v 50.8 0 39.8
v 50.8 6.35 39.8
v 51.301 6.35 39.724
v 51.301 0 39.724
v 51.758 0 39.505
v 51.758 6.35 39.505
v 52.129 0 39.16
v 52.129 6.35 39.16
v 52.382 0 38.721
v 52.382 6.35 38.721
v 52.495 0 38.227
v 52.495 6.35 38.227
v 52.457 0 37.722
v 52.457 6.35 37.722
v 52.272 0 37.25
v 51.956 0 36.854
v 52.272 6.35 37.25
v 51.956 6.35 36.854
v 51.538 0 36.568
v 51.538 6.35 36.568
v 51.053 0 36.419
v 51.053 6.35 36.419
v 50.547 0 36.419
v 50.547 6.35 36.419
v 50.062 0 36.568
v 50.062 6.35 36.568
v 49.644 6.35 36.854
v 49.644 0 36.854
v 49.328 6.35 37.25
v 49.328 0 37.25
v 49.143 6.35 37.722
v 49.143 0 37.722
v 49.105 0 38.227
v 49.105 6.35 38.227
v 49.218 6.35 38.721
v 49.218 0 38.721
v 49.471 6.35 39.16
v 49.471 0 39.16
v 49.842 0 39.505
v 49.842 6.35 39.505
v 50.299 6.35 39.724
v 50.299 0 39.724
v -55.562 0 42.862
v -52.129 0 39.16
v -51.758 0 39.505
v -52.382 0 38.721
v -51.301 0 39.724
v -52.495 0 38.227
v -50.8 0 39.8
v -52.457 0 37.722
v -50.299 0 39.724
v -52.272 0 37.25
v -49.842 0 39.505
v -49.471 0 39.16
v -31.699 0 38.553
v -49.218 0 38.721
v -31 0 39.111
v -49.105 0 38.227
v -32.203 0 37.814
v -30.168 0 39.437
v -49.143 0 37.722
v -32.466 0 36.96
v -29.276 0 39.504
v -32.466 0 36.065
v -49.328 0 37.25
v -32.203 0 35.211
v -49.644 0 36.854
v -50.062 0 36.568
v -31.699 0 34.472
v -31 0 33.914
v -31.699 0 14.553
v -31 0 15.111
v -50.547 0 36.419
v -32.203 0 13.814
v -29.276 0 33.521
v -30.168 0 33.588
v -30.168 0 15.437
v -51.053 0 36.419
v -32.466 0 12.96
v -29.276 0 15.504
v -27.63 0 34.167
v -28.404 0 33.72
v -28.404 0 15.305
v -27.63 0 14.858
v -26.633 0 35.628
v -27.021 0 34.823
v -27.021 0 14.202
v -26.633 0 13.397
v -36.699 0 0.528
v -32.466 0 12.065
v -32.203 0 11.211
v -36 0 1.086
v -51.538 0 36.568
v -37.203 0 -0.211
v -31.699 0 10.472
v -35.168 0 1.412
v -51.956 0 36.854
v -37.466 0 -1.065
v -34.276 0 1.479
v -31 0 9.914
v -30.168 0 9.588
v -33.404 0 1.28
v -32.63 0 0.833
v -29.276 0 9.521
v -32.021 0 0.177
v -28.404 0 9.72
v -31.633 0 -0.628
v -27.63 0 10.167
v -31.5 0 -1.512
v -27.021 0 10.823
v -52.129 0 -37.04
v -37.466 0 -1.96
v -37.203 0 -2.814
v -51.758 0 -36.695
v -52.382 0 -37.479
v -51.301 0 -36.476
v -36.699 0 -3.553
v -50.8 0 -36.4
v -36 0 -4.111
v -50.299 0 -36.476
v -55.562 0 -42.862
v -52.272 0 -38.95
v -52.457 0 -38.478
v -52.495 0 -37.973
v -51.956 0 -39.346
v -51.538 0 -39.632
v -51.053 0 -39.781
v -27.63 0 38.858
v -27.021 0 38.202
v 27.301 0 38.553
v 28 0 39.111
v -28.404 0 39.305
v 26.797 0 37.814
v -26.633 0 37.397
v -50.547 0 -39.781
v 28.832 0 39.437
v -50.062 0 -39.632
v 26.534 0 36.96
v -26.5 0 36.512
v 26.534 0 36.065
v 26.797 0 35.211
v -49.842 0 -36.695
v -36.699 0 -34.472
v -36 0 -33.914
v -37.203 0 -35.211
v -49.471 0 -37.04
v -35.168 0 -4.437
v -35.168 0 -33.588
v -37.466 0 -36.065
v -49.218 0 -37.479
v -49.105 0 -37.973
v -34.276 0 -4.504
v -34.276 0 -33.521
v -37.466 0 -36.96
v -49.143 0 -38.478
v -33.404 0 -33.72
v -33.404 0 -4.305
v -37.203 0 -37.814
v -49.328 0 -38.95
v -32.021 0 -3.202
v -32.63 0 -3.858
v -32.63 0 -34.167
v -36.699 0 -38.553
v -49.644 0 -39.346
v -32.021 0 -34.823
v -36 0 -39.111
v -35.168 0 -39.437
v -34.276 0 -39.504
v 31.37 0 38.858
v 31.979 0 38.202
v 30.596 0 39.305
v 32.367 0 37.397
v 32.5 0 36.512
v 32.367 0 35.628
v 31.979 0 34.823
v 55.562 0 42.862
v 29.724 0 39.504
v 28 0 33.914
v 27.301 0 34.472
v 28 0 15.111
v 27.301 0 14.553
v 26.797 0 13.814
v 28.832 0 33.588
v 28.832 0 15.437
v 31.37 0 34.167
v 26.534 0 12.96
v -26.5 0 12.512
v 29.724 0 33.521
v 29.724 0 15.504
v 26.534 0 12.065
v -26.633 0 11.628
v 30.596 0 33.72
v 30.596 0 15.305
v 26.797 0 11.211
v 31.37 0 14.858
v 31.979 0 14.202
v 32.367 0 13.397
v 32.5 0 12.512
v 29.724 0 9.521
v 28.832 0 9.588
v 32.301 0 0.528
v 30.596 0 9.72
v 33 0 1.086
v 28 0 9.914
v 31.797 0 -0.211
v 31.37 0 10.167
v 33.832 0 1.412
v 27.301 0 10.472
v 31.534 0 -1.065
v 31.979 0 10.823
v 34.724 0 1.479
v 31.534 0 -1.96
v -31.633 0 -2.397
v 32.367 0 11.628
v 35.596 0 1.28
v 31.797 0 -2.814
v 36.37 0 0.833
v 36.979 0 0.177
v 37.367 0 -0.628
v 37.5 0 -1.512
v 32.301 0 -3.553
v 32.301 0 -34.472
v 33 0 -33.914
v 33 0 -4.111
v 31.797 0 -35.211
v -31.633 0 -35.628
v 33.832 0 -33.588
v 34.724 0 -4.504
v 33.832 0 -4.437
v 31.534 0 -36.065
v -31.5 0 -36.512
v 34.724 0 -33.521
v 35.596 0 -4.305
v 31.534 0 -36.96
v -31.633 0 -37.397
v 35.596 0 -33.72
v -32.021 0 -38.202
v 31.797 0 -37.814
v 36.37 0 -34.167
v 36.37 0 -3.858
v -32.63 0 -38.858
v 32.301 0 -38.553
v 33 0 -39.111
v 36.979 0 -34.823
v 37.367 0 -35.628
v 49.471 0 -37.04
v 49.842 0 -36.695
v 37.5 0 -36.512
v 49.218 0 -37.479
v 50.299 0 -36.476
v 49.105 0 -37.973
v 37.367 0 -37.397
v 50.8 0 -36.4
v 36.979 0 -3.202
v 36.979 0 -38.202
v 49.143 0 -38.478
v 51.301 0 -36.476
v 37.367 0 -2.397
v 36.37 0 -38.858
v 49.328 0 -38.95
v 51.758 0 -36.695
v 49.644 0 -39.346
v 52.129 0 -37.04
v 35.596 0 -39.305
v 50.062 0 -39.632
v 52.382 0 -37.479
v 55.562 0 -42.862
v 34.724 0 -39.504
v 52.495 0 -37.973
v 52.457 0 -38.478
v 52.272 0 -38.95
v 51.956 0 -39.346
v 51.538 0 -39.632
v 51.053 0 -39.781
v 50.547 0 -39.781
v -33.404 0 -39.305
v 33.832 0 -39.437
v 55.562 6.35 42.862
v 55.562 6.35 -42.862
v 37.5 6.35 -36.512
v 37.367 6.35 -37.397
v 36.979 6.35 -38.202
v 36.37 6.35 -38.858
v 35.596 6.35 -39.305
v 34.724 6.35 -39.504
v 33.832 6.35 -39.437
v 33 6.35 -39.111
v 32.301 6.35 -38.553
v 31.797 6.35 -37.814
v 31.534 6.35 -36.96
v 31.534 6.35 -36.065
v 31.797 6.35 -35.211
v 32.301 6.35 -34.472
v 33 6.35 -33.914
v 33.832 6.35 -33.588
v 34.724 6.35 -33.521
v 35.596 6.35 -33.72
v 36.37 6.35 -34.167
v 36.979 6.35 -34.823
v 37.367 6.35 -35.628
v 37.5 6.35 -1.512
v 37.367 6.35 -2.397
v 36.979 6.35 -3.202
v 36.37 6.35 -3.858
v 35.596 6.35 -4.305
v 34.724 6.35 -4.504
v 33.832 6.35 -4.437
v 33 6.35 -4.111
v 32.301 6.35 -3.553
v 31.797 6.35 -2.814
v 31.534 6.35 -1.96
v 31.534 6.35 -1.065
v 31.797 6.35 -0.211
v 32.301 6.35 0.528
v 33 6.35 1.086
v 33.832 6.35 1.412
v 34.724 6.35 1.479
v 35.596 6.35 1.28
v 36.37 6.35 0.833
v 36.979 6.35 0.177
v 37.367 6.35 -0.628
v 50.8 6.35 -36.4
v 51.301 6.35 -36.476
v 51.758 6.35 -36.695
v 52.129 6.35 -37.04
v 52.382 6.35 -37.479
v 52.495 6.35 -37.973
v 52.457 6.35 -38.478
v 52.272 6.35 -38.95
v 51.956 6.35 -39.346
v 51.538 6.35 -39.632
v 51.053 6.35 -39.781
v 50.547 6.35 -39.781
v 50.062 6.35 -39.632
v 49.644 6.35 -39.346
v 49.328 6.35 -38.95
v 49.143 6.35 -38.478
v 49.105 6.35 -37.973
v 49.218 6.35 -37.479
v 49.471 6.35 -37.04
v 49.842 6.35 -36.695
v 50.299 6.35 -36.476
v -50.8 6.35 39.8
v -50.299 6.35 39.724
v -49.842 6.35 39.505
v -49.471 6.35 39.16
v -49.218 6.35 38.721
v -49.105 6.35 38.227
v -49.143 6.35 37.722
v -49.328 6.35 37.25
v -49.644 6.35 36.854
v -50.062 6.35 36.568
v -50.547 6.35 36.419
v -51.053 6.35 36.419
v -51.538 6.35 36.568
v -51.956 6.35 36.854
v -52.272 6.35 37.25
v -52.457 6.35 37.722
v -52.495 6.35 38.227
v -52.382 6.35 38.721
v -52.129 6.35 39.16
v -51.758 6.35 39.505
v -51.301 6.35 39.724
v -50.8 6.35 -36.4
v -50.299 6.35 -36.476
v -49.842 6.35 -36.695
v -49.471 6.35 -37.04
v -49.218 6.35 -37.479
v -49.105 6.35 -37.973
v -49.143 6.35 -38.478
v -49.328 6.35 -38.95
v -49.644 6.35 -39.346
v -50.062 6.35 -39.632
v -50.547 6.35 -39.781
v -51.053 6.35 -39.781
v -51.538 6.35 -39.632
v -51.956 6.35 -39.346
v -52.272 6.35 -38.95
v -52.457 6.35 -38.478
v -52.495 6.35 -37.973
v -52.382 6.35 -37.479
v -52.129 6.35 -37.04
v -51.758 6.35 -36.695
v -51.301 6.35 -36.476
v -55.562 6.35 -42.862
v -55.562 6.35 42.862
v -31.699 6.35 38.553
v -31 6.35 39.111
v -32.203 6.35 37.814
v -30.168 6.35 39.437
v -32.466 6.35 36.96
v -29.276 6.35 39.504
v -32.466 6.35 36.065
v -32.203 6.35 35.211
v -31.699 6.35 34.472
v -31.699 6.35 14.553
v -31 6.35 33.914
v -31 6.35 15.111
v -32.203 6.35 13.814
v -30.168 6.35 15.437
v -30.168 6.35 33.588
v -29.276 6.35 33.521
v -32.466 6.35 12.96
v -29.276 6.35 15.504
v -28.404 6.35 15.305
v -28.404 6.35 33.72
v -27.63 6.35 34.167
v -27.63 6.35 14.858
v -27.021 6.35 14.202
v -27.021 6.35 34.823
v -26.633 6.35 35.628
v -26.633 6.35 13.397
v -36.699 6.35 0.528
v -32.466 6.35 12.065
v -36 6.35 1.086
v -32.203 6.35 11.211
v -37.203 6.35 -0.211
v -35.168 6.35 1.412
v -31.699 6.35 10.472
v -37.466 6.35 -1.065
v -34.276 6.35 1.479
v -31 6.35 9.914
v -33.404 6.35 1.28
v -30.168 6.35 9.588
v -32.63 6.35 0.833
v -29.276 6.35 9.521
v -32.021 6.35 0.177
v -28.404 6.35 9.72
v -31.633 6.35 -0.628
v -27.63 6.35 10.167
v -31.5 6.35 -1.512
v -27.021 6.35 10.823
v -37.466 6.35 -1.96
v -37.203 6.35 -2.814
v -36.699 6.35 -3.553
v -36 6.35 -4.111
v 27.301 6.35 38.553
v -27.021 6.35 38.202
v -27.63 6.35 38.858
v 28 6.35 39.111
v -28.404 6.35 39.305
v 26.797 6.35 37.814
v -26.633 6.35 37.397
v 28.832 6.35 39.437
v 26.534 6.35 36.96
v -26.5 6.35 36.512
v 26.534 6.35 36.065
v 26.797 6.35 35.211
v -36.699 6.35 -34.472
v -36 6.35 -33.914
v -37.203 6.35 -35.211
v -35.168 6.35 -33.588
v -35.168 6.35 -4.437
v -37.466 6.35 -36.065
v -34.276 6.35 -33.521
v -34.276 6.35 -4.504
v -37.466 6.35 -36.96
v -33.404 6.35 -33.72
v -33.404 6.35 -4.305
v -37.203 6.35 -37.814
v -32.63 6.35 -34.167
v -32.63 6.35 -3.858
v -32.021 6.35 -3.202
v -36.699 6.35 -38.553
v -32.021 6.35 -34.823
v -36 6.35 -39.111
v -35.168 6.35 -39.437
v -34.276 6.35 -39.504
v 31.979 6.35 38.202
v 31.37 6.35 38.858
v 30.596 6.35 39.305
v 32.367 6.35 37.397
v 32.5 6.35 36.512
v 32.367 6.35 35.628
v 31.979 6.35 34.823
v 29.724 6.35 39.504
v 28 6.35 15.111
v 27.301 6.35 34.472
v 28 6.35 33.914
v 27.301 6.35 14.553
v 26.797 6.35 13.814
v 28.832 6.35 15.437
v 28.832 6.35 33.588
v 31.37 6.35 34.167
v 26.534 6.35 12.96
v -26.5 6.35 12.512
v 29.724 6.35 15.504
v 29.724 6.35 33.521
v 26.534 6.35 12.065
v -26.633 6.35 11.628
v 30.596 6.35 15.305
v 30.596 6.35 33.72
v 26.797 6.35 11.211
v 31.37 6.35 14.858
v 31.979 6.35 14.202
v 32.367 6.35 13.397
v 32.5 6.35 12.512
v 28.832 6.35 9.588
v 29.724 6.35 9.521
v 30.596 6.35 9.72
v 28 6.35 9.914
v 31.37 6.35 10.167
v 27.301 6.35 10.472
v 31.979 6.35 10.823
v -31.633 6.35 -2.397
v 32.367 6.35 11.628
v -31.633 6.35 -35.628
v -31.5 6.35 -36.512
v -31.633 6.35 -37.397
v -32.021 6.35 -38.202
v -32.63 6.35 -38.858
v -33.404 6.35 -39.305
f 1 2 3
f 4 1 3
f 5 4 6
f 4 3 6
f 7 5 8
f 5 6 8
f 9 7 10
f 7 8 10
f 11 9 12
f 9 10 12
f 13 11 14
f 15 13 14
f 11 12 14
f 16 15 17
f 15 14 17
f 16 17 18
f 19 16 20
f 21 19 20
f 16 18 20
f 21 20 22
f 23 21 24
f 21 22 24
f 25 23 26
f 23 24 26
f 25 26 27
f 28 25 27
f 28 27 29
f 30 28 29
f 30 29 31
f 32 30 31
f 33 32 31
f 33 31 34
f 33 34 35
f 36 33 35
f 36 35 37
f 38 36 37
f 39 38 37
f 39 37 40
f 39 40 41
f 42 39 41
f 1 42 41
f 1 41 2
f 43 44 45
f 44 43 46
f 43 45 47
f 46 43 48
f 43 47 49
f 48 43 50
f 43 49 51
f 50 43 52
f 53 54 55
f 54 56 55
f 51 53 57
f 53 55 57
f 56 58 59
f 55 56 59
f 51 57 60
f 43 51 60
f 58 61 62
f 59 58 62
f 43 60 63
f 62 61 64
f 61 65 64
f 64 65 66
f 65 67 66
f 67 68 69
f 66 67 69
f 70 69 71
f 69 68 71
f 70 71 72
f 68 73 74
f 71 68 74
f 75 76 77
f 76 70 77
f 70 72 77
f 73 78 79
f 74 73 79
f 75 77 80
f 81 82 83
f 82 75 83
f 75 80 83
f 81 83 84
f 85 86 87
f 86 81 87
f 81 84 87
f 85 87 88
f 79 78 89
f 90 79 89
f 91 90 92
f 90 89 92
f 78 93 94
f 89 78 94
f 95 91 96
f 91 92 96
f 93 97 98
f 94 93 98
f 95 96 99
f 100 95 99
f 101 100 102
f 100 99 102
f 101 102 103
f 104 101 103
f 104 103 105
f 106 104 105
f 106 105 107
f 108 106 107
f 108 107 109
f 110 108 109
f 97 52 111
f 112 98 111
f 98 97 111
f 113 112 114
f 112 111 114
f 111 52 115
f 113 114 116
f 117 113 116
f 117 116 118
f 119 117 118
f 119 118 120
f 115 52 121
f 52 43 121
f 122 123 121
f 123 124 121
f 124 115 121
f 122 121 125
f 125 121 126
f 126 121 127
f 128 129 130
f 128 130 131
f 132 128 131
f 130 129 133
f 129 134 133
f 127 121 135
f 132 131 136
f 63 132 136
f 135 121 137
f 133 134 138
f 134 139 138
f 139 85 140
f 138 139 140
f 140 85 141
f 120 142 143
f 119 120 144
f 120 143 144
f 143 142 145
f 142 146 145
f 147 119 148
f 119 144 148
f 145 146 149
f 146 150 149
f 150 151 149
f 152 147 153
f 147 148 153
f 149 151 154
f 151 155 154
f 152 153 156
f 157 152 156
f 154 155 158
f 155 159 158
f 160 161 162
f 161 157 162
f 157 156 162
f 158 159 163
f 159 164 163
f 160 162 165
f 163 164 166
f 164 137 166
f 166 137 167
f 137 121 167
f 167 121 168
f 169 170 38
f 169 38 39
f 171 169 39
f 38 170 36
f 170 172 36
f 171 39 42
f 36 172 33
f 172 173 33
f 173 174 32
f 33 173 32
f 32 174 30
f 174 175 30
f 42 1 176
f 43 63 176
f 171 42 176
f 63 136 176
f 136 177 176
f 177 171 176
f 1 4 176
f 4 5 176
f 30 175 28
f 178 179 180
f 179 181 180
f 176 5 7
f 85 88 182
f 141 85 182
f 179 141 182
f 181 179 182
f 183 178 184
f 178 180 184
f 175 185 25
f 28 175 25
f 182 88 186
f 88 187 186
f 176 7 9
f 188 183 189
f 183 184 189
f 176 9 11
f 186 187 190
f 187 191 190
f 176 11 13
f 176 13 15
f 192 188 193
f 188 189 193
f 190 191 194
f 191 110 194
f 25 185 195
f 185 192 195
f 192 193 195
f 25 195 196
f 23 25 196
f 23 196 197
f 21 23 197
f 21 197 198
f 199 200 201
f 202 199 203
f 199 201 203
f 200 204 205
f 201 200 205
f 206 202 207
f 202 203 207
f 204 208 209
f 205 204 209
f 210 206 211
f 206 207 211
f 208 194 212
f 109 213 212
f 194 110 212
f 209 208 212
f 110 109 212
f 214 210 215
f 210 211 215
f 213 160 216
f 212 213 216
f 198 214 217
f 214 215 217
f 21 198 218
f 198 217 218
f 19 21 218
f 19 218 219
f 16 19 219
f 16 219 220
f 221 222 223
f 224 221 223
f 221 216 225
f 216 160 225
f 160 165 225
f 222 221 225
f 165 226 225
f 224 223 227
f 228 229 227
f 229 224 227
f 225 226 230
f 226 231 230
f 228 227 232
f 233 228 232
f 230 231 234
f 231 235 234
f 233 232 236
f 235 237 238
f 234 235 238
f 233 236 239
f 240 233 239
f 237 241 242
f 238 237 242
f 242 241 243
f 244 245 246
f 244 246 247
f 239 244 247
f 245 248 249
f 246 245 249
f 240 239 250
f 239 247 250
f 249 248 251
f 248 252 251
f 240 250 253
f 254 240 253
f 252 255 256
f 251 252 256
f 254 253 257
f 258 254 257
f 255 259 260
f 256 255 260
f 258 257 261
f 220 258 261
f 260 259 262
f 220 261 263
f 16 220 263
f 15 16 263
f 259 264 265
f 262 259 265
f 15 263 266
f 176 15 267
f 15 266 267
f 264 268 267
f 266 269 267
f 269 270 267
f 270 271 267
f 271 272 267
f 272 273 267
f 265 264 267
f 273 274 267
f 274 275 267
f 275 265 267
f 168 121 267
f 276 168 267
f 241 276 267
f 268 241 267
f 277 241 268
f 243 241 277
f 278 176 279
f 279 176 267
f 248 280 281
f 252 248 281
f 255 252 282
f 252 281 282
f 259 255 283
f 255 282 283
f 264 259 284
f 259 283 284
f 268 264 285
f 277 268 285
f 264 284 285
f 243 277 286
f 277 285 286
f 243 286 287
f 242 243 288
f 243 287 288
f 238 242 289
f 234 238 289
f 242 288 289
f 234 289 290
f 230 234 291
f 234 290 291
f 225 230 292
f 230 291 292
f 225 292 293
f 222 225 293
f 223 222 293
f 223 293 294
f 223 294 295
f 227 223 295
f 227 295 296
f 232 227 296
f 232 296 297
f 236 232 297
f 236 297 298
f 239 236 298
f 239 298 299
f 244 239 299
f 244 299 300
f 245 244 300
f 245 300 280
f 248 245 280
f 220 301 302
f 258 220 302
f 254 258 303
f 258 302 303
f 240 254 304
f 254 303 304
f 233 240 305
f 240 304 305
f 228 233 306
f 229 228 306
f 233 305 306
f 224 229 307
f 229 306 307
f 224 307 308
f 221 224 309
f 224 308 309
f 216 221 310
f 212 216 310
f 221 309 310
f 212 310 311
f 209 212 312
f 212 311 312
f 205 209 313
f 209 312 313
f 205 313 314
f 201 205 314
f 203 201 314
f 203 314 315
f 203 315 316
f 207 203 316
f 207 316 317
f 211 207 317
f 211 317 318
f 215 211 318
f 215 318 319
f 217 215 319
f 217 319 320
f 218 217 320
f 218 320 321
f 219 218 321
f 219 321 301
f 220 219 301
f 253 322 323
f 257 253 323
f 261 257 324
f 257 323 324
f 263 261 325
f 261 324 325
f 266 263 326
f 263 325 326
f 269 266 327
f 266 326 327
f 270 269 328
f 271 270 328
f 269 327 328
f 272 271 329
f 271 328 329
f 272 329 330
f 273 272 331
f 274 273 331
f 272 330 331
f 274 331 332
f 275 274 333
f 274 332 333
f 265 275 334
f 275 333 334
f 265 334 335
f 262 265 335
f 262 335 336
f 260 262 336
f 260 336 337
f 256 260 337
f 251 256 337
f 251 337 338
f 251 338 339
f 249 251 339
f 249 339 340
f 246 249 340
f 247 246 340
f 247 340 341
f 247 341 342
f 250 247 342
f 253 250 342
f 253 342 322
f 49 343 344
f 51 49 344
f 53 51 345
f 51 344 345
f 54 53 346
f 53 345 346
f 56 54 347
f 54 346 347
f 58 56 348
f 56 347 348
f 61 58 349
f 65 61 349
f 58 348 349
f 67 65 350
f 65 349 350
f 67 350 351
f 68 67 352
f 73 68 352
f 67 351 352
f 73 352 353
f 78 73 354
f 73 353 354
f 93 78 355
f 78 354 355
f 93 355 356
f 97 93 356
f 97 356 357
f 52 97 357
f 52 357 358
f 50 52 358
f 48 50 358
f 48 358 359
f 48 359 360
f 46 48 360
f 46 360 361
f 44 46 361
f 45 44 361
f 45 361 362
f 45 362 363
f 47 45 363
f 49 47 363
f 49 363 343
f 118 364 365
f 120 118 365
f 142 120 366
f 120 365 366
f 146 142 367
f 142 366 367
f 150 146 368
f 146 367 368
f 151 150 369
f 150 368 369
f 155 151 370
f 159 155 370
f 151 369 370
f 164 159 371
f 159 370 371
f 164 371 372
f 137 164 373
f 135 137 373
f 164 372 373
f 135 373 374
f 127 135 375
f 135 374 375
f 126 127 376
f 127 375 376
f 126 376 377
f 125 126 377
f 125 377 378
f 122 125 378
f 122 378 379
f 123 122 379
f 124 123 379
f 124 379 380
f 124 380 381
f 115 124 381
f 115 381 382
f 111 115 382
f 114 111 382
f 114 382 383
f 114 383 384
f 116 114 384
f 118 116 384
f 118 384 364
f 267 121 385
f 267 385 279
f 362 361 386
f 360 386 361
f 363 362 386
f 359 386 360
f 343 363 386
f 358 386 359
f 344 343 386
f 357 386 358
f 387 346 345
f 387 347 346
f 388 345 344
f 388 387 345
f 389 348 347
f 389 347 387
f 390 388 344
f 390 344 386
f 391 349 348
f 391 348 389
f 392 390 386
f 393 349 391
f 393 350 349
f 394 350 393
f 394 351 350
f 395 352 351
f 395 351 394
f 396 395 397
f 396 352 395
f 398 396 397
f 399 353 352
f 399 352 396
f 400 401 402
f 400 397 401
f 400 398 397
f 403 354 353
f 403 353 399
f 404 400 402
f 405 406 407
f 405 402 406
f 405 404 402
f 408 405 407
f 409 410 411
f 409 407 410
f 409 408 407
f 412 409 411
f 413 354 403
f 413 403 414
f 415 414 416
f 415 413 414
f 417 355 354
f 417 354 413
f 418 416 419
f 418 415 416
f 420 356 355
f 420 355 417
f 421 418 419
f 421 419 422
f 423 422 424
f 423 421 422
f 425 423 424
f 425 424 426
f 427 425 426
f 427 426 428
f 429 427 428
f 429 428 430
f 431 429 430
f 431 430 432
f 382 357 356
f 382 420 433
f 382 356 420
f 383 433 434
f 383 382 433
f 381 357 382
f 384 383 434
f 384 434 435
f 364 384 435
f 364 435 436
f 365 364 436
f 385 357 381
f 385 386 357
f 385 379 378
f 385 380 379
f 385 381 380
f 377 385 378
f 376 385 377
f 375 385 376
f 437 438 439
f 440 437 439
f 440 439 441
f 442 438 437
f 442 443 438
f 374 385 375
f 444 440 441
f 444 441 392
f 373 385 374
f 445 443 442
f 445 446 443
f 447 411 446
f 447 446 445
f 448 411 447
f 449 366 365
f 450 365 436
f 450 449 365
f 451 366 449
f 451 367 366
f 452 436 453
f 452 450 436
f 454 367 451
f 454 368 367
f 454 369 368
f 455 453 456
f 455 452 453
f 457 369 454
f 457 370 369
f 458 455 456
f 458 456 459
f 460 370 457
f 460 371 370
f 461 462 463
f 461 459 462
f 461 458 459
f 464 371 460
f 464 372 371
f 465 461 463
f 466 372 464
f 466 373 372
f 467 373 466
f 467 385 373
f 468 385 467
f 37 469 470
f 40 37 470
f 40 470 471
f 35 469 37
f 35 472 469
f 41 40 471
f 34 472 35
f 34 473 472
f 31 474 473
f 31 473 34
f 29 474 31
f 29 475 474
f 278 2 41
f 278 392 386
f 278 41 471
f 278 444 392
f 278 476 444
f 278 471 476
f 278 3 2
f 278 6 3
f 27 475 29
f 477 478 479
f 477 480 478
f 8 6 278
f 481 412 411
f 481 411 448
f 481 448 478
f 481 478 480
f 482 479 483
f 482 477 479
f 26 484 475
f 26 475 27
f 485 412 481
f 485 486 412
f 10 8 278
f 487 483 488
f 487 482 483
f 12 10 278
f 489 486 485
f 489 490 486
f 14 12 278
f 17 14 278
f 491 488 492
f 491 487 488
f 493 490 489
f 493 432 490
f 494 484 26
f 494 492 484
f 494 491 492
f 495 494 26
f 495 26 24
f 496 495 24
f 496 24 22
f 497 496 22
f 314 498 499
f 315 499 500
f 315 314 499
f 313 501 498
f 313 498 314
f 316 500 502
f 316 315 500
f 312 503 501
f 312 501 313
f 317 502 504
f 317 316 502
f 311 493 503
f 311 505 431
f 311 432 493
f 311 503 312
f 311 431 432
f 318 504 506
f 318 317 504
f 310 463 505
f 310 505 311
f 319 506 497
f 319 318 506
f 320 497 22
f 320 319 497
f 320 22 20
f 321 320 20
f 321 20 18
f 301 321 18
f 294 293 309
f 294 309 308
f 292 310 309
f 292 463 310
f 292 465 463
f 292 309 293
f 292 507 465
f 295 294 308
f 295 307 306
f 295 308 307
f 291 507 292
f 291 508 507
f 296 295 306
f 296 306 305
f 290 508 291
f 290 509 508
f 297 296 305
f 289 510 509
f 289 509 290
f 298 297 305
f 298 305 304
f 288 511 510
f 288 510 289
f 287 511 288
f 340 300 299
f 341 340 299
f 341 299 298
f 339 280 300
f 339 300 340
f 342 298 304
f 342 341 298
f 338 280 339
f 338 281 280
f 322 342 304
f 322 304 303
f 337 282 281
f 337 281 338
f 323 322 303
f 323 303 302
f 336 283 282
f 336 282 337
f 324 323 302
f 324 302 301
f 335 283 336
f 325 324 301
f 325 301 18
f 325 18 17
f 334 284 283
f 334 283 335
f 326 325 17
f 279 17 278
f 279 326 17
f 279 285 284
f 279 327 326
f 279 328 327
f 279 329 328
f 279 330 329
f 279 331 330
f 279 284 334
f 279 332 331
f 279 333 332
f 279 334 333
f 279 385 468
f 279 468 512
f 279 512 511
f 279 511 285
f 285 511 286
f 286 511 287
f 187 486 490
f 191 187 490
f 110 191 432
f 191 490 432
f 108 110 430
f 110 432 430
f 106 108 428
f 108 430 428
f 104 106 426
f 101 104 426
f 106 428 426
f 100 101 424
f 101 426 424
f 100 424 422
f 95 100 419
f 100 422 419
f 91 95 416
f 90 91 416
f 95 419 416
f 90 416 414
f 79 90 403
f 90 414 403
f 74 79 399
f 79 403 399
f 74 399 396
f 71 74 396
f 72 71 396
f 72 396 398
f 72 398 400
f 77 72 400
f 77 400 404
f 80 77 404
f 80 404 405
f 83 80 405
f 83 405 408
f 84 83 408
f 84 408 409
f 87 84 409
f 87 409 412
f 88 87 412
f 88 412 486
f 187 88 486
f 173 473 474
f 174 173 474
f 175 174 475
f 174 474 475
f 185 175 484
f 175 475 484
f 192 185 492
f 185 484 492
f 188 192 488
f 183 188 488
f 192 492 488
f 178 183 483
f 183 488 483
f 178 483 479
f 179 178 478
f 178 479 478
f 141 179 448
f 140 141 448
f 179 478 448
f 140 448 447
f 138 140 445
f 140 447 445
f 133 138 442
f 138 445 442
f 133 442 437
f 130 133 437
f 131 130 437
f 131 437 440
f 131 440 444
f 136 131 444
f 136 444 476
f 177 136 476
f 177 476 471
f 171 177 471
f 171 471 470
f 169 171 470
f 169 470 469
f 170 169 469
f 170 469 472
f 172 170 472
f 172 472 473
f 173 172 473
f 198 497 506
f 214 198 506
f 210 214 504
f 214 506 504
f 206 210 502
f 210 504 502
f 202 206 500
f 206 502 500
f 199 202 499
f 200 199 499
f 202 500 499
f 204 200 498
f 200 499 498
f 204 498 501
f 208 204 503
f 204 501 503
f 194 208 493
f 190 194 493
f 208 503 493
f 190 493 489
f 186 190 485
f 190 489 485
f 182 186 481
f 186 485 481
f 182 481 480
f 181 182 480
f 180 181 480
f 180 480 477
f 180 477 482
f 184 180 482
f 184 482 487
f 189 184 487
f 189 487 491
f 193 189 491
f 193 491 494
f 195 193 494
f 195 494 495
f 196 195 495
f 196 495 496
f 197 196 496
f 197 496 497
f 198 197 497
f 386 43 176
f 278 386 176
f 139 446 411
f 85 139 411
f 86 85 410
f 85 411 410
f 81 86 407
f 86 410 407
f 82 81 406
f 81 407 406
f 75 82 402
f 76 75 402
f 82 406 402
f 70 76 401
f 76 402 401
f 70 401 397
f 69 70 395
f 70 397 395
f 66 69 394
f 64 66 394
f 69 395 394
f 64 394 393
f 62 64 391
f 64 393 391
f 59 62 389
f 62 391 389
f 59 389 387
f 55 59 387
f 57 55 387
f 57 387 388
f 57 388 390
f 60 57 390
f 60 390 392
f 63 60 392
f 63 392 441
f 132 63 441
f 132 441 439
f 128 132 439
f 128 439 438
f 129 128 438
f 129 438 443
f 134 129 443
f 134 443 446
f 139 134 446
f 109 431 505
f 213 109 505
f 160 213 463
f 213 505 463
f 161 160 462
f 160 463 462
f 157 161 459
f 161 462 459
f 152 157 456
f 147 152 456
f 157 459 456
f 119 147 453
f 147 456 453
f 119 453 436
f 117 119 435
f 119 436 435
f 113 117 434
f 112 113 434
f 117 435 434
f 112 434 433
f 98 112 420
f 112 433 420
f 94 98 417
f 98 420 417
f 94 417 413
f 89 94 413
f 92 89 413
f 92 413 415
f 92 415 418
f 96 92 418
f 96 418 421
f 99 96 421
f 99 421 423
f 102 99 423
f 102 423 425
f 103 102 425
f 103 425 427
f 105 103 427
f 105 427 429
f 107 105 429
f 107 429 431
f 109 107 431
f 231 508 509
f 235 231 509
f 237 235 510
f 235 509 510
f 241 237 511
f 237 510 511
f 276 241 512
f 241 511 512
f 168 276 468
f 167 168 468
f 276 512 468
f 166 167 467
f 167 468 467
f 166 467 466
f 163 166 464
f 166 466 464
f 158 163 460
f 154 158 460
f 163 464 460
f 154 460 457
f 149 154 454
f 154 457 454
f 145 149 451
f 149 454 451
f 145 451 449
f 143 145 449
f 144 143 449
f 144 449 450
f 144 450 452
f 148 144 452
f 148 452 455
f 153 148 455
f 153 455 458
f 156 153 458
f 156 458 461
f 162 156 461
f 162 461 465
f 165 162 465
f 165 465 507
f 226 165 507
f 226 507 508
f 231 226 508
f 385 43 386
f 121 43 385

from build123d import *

# Parameters (mm, degrees)
SKETCH1_W            = 111.125
SKETCH1_H            = 85.725
BOSS_EXTRUDE1_DEPTH  = 6.35
M3_CLEARANCE_HOLE1_D = 3.4
SKETCH3_R            = 3
CUT_EXTRUDE1_DEPTH   = 7.35


with BuildPart() as part:
    # Sketch1 → Boss-Extrude1 (new body)
    with BuildSketch(Plane(origin=(0, 0, 0), x_dir=(1, 0, 0), z_dir=(0, 1, 0))):
        Rectangle(SKETCH1_W, SKETCH1_H)
    extrude(amount=BOSS_EXTRUDE1_DEPTH)

    # M3 Clearance Hole1 (through all)
    with Locations(Plane(origin=(-50.8, 0, 38.1), x_dir=(0, 0, -1), z_dir=(0, -1, 0))):
        with Locations((0, 0), (0, 101.6), (76.2, 0), (76.2, 101.6)):
            Hole(M3_CLEARANCE_HOLE1_D / 2)

    # Sketch3 → Cut-Extrude1 (cut, through all)
    with BuildSketch(Plane(origin=(0, 6.35, 0), x_dir=(1, 0, 0), z_dir=(0, 1, 0))):
        with Locations((-34.5, 36.5125)):
            Circle(SKETCH3_R)
        with Locations((34.5, 36.5125)):
            Circle(SKETCH3_R)
        with Locations((34.5, 1.5125)):
            Circle(SKETCH3_R)
        with Locations((-34.5, 1.5125)):
            Circle(SKETCH3_R)
        with Locations((-29.5, -12.5125)):
            Circle(SKETCH3_R)
        with Locations((-29.5, -36.5125)):
            Circle(SKETCH3_R)
        with Locations((29.5, -36.5125)):
            Circle(SKETCH3_R)
        with Locations((29.5, -12.5125)):
            Circle(SKETCH3_R)
    extrude(amount=-CUT_EXTRUDE1_DEPTH, mode=Mode.SUBTRACT)


solid = part.part
